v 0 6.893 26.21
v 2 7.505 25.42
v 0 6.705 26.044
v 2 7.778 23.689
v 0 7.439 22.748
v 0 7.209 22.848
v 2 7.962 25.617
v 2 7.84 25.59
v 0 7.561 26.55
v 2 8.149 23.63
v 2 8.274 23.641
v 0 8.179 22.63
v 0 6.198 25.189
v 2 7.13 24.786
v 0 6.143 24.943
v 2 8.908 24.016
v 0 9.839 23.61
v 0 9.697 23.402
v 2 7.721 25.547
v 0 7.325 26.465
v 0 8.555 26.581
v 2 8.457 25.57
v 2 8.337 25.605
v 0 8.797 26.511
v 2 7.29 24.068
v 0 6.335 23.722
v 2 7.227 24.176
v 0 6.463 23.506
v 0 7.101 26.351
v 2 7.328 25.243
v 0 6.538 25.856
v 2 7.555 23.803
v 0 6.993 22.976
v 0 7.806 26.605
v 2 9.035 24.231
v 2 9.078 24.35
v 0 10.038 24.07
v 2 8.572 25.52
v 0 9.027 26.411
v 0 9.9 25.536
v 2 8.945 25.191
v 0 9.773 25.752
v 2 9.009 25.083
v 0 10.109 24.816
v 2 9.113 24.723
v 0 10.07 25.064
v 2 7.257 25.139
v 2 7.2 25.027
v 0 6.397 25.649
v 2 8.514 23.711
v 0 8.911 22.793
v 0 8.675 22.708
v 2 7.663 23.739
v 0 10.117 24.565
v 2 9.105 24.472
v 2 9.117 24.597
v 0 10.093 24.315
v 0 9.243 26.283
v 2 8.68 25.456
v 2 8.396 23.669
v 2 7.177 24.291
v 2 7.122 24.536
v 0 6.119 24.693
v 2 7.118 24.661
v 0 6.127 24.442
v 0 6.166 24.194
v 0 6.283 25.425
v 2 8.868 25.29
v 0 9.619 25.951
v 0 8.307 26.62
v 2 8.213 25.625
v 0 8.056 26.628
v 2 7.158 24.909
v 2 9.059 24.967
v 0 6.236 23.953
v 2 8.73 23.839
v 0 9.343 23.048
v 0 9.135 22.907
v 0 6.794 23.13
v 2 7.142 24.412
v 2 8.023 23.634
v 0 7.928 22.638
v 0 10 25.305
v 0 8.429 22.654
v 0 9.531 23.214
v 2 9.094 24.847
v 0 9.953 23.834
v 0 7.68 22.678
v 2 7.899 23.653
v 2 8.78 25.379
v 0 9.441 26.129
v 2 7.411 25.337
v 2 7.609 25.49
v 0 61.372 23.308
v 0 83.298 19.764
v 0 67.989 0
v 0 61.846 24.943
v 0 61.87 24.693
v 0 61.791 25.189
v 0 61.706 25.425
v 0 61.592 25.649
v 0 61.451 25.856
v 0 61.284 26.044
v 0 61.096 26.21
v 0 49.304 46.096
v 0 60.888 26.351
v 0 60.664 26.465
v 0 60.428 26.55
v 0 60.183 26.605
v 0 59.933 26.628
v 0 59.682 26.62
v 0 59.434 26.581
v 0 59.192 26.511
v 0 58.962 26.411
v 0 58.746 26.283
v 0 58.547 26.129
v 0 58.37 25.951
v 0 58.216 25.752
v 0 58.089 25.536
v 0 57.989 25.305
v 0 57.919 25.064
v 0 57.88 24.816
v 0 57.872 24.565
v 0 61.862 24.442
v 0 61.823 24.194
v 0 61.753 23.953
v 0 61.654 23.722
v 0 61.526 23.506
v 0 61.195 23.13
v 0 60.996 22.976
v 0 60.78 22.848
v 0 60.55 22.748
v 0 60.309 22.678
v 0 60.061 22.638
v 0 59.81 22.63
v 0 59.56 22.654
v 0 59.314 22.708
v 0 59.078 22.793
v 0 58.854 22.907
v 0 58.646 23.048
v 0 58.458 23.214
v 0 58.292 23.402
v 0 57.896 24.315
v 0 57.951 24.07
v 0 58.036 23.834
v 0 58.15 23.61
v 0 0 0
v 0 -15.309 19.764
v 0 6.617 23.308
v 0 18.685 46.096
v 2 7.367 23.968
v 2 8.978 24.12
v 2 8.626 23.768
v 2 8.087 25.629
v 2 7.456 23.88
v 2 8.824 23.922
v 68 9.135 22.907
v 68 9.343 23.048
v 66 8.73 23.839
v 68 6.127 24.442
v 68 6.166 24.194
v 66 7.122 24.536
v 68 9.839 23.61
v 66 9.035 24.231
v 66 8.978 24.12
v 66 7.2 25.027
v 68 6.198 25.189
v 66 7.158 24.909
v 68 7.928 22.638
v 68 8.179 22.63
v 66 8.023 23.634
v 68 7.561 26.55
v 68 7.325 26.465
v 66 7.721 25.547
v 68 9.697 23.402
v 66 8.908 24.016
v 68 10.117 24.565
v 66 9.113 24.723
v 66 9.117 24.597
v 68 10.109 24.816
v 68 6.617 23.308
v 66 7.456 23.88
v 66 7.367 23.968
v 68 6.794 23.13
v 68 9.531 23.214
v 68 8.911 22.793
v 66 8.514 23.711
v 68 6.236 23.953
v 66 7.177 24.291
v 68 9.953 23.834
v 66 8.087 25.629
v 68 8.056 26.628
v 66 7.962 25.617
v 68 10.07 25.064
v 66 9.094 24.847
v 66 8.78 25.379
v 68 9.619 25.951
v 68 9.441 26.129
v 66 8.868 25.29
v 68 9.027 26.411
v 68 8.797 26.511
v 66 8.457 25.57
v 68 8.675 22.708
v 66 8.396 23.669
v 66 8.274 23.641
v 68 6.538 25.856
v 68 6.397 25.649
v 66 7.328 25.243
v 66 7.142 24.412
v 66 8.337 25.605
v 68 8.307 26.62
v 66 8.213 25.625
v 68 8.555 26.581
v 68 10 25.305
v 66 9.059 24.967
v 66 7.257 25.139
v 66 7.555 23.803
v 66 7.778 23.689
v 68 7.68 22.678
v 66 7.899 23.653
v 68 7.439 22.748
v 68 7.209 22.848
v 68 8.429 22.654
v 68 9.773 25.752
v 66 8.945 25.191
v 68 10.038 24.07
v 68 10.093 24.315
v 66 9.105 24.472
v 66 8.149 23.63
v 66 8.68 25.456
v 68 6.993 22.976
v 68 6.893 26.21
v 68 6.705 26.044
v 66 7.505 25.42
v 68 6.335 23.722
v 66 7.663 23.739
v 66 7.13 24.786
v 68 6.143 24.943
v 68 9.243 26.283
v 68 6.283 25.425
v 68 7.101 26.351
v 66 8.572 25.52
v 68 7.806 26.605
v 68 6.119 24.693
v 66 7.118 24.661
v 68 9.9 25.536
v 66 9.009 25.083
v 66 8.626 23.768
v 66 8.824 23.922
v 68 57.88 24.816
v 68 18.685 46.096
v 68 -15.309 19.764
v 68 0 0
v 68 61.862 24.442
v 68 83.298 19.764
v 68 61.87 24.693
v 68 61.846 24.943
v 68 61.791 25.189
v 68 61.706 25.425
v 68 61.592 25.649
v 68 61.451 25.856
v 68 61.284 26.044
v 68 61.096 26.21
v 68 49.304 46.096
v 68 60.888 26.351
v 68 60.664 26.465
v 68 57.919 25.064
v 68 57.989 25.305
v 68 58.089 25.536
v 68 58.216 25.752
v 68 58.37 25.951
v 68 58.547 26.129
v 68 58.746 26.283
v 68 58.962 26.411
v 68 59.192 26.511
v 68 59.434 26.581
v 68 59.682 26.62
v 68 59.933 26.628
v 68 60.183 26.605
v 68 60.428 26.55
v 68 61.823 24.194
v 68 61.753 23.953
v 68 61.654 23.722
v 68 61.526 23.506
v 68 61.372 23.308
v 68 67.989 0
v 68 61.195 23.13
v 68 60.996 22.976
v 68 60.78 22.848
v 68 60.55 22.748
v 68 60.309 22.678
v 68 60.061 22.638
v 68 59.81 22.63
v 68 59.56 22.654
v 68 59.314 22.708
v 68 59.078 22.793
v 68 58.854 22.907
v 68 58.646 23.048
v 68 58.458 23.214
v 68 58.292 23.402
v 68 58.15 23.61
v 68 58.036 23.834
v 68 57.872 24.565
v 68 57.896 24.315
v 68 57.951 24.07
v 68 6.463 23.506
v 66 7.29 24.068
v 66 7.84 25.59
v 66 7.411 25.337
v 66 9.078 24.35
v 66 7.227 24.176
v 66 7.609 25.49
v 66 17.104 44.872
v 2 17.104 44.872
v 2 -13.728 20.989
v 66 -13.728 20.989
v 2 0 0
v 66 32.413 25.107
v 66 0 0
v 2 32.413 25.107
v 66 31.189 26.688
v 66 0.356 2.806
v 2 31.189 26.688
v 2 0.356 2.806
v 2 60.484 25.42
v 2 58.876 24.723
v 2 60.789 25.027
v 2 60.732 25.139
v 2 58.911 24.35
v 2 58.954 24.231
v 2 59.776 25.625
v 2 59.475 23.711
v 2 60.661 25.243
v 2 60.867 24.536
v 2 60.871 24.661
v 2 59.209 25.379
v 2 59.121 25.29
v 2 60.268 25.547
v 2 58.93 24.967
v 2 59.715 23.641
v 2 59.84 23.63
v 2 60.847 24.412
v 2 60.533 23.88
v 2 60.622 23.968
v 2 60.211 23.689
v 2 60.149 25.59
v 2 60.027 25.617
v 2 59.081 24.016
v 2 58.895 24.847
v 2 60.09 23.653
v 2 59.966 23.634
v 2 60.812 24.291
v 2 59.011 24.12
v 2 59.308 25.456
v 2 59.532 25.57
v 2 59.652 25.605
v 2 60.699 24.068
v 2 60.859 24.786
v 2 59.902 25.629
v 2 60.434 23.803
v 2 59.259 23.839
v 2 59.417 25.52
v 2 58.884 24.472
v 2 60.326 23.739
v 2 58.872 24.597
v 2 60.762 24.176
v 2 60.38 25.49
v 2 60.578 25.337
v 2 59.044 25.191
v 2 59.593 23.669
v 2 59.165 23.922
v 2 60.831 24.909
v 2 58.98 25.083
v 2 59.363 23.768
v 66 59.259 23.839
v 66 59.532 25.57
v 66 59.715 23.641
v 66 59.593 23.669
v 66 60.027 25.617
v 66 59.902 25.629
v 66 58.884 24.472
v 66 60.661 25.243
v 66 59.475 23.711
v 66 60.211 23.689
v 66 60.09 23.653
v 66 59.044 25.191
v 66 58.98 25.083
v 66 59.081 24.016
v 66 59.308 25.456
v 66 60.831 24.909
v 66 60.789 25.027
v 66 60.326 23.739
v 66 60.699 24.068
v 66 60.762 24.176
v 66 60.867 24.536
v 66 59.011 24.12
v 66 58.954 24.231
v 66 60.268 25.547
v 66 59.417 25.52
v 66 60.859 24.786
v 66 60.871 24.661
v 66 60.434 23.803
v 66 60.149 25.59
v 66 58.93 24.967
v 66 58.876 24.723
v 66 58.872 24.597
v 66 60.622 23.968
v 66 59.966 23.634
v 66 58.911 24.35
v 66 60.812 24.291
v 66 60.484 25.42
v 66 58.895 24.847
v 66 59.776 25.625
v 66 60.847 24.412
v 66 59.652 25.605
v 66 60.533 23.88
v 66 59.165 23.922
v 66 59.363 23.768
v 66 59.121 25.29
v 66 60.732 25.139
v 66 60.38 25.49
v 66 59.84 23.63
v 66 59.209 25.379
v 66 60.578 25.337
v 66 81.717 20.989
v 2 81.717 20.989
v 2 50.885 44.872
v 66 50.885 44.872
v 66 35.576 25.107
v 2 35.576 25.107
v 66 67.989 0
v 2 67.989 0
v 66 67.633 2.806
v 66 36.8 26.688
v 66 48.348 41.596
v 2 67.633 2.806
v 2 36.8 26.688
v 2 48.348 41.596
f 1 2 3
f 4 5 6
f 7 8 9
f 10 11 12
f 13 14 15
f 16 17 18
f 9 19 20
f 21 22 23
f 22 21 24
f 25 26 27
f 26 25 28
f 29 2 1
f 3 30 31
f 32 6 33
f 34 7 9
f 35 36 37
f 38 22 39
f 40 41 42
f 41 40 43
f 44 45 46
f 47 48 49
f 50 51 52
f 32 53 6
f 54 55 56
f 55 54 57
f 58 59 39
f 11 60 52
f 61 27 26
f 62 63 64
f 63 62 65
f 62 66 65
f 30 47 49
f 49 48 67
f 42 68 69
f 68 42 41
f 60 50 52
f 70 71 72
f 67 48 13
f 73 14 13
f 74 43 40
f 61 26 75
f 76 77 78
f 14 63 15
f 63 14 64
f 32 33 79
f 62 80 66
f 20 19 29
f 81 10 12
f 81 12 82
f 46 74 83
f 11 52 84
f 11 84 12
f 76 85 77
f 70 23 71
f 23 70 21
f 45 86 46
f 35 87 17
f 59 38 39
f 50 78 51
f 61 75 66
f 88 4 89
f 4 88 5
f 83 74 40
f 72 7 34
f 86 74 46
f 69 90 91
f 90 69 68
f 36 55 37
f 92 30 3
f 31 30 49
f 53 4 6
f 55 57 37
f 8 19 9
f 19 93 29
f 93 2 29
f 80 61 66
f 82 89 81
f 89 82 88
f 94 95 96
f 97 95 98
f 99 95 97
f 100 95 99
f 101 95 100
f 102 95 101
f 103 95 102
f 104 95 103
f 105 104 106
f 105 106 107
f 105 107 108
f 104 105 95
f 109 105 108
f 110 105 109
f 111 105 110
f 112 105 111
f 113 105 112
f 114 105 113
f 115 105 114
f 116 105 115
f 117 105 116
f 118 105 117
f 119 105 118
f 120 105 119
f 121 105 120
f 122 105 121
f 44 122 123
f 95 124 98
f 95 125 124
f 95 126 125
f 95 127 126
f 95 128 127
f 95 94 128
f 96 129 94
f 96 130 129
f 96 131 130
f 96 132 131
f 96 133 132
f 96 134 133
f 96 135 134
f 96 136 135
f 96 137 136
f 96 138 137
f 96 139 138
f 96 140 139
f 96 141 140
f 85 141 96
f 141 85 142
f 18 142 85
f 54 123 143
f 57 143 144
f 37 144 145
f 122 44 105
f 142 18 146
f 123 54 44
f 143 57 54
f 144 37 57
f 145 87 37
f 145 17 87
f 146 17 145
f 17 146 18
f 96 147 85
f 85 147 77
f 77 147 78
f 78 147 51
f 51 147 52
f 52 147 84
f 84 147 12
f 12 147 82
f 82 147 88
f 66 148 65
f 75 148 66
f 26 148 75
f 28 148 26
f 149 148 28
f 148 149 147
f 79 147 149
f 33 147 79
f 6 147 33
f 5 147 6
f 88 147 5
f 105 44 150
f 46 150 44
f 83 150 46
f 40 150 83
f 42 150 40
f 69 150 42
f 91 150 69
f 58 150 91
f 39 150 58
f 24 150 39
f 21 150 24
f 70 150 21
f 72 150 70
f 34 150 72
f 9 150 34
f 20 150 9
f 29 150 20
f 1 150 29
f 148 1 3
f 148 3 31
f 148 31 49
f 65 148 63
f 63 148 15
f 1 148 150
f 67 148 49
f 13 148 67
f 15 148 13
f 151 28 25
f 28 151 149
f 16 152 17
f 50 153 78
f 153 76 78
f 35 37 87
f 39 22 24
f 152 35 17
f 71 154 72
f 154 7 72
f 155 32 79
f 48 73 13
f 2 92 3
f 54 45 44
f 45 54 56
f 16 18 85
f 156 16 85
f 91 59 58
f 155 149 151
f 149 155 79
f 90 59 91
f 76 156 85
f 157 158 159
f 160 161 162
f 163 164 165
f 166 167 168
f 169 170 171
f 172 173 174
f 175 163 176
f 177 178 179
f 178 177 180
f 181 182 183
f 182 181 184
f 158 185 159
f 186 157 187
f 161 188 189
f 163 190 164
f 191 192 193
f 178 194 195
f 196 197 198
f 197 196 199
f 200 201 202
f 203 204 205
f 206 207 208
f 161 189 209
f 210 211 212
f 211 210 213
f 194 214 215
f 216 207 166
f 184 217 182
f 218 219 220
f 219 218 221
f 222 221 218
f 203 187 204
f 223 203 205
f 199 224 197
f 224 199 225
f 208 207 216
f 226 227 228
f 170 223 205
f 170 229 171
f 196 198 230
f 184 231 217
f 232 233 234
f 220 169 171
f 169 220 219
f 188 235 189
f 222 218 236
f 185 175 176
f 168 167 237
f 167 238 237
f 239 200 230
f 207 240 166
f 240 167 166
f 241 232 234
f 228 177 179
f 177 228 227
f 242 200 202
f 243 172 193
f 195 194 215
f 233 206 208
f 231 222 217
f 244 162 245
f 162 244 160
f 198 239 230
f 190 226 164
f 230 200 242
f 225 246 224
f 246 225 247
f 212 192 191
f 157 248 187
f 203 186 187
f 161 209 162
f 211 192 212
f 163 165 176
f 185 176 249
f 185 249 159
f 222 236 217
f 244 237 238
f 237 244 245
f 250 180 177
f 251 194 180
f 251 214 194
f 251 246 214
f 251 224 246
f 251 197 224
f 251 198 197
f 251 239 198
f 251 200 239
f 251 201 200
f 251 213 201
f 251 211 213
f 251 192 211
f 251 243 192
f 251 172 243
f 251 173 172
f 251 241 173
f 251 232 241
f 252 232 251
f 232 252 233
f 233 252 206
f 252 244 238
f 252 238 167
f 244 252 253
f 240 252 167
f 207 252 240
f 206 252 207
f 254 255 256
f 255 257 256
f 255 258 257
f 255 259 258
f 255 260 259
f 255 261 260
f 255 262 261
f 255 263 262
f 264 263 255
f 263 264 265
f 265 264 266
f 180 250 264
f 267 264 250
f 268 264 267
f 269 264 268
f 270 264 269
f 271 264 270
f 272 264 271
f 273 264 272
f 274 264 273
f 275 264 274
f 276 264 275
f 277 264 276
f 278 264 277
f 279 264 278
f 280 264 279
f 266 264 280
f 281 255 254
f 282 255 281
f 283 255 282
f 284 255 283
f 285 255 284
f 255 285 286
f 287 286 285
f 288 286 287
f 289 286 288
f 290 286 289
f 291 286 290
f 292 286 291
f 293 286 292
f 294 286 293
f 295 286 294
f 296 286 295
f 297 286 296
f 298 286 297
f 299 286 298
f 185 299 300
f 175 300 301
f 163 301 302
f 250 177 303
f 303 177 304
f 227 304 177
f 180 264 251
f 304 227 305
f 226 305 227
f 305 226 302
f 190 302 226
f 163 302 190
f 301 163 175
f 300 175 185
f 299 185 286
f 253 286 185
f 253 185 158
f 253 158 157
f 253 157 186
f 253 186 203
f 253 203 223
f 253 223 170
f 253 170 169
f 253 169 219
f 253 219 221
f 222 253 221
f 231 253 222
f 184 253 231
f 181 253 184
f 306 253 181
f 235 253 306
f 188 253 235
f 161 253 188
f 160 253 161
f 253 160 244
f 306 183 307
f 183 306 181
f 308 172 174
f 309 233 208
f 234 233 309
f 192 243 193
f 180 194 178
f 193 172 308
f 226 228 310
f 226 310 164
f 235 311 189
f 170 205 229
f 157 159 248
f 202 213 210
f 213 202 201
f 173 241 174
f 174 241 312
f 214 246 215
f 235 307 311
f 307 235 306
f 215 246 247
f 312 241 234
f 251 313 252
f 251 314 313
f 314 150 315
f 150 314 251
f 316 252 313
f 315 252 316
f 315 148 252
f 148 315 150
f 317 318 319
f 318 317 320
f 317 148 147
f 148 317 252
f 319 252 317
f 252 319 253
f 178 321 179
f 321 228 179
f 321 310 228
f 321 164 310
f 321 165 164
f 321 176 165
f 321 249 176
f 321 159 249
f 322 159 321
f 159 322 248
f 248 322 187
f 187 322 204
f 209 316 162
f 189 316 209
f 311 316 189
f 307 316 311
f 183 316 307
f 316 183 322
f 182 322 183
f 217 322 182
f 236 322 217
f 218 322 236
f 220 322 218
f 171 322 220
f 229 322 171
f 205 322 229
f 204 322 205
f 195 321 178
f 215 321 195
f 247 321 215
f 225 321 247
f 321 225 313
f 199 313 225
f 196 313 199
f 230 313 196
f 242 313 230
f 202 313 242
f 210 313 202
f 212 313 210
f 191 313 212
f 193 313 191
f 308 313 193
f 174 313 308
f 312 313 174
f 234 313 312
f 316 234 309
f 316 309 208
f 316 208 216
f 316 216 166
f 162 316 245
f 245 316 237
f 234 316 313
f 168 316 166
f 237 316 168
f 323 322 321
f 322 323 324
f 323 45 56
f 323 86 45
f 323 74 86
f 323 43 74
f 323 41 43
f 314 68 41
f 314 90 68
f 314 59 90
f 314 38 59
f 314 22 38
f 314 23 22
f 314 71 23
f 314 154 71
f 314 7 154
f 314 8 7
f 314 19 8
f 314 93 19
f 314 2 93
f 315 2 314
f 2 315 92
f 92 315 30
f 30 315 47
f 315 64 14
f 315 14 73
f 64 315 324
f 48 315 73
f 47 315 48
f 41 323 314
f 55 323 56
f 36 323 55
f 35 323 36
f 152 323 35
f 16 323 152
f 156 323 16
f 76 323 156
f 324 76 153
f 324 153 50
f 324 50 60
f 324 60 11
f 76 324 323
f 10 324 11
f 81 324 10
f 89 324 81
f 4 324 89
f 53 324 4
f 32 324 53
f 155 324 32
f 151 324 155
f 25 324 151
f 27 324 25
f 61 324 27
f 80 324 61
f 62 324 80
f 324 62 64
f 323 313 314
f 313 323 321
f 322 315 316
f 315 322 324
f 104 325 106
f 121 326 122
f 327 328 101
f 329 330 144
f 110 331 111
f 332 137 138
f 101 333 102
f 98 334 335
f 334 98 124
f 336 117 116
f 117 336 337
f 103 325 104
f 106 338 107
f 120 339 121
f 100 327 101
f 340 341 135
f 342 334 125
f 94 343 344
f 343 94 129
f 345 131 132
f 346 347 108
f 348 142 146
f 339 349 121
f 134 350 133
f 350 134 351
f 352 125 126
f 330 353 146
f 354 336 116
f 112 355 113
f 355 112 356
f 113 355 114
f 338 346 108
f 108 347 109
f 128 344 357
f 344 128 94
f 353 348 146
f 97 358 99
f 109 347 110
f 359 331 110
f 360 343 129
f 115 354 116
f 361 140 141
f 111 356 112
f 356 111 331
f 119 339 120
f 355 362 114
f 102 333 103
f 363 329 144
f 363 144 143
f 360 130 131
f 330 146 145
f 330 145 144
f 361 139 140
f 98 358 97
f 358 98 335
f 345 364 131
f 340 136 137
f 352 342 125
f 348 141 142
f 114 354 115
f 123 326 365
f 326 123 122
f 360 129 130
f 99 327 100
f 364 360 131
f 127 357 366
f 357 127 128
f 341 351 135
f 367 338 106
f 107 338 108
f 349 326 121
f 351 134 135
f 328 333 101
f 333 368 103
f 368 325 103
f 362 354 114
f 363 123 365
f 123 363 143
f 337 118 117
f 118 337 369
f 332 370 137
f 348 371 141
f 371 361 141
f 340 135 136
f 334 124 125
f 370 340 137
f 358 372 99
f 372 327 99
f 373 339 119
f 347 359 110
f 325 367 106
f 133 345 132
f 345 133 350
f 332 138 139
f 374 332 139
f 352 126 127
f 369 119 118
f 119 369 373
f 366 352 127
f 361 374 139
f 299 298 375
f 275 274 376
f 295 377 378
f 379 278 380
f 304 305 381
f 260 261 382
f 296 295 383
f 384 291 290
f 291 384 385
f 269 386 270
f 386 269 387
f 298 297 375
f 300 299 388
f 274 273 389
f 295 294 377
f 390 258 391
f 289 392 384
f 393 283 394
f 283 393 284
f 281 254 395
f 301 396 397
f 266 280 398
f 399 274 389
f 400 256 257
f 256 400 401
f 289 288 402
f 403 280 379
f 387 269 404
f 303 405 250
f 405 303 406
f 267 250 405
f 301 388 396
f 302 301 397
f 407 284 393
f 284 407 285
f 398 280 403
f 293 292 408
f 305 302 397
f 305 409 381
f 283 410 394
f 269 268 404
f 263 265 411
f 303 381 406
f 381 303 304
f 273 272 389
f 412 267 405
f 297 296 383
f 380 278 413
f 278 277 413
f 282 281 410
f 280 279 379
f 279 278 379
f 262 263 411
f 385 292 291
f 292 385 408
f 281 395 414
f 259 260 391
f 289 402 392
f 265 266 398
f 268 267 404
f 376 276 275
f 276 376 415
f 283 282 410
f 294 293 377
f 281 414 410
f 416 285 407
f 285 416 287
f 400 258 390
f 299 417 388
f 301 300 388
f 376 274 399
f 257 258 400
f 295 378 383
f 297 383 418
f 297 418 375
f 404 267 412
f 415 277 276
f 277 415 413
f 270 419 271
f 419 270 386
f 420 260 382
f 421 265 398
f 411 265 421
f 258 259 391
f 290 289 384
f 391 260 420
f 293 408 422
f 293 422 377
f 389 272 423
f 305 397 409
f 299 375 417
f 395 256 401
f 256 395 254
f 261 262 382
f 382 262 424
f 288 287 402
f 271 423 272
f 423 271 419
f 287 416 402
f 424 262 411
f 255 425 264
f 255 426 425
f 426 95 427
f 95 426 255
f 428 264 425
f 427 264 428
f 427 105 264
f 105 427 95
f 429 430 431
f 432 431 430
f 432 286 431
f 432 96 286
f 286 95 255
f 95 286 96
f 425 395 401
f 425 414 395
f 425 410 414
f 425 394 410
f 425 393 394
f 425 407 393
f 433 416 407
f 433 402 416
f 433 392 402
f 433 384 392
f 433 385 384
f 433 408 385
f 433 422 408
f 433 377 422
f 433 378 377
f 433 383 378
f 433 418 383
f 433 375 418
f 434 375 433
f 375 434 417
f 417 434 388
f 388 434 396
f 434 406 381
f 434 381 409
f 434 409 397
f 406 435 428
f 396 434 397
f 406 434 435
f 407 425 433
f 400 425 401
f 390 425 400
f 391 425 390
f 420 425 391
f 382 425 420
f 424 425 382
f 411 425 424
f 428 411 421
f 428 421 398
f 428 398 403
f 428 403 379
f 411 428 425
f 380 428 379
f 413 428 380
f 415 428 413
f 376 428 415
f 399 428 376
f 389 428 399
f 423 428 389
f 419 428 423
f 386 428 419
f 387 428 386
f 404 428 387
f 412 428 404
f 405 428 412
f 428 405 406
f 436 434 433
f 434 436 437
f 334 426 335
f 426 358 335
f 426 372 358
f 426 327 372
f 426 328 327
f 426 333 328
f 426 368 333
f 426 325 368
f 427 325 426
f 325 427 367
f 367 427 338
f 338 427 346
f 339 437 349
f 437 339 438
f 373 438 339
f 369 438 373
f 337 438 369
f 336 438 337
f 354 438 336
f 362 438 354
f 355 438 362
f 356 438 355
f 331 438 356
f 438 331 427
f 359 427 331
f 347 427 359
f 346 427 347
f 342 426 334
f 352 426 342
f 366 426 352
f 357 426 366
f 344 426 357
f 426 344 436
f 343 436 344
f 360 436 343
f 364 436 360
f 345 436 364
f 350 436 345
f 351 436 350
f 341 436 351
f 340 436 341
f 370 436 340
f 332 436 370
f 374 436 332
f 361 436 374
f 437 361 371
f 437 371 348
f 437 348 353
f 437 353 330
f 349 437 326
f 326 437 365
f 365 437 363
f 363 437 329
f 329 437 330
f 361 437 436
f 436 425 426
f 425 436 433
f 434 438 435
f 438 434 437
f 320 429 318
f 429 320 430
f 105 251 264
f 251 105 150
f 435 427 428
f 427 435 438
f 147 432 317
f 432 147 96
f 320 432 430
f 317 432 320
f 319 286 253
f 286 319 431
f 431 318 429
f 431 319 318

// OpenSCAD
// file: screw-hole.scad
module screw_hole(screw_radius) {
  length = 100;
  head_radius = screw_radius * 2;
  rotate(180, [1, 0, 0]) {
    cylinder(head_radius, r1=head_radius, r2=screw_radius);
    cylinder(length, r=screw_radius);
  }
}
// main file
$fn = 50;
include <screw-hole.scad>

wood_length = 1000;
bottom_length = 500;

wood_x = 64;
wood_y = 39;
wood_depth = 25;
wall_thickness = 2;

bottom_angle = acos((bottom_length / 2) / wood_length);
top_angle = 2 * asin((bottom_length / 2) / wood_length);

screw_radius = 2 / 2;

module trapazoid(bottom_width, top_width, height) {
  h = bottom_width / 2;
  j = top_width / 2;
  polygon(
    [
      [0, 0],
      [bottom_width, 0],
      [h + j, height],
      [h - j, height]
    ]
  );
}

module connector(angle) {
  hypot = wood_y + wall_thickness * 2;
  theta = angle / 2;
  opp = sin(theta) * hypot;
  adj = cos(theta) * hypot;

  module top_rotatation(gap) {
    children(0);
    translate([0, gap, 0])
      rotate(angle, [-1, 0, 0])
        children(0);
  }

  module box_shape() {
    difference() {
      cube(
        [
          wood_x + wall_thickness * 2,
          wood_y + wall_thickness * 2,
          wood_depth
        ]
      );
      translate(
        [
          0,
          (wood_y + wall_thickness * 2) / 2,
          (wood_depth + wall_thickness * 2) / 2
        ]
      ) {
        rotate(90, [0, -1, 0])
          screw_hole(screw_radius);
        translate([wood_x + wall_thickness * 2, 0, 0])
          rotate(90, [0, 1, 0])
            screw_hole(screw_radius);
      }
      translate([wall_thickness, wall_thickness, wall_thickness])
        cube([wood_x, wood_y, wood_depth]);
    }
  }

  module top_inner_gap() {
    hull() {
      top_rotatation(wall_thickness) {
        cube(
          [
            wood_x + wall_thickness * 2,
            wall_thickness,
            wood_depth
          ]
        );
      }
    }
  }

  rotate(90, [0, 0, 1])
    rotate(90, [1, 0, 0])
      linear_extrude(wall_thickness)
        trapazoid(adj * 2, wall_thickness * 2, opp);
  translate([wood_x + wall_thickness, 0, 0])
    rotate(90, [0, 0, 1])
      rotate(90, [1, 0, 0])
        linear_extrude(wall_thickness)
          trapazoid(adj * 2, wall_thickness * 2, opp);

  module boxes() {
    top_rotatation(wood_y + wall_thickness * 2) {
      box_shape();
    }
    translate([0, wood_y + wall_thickness, 0])
      top_inner_gap();
  }

  rotate(angle / 2, [1, 0, 0])
    boxes();
}

connector(bottom_angle);
